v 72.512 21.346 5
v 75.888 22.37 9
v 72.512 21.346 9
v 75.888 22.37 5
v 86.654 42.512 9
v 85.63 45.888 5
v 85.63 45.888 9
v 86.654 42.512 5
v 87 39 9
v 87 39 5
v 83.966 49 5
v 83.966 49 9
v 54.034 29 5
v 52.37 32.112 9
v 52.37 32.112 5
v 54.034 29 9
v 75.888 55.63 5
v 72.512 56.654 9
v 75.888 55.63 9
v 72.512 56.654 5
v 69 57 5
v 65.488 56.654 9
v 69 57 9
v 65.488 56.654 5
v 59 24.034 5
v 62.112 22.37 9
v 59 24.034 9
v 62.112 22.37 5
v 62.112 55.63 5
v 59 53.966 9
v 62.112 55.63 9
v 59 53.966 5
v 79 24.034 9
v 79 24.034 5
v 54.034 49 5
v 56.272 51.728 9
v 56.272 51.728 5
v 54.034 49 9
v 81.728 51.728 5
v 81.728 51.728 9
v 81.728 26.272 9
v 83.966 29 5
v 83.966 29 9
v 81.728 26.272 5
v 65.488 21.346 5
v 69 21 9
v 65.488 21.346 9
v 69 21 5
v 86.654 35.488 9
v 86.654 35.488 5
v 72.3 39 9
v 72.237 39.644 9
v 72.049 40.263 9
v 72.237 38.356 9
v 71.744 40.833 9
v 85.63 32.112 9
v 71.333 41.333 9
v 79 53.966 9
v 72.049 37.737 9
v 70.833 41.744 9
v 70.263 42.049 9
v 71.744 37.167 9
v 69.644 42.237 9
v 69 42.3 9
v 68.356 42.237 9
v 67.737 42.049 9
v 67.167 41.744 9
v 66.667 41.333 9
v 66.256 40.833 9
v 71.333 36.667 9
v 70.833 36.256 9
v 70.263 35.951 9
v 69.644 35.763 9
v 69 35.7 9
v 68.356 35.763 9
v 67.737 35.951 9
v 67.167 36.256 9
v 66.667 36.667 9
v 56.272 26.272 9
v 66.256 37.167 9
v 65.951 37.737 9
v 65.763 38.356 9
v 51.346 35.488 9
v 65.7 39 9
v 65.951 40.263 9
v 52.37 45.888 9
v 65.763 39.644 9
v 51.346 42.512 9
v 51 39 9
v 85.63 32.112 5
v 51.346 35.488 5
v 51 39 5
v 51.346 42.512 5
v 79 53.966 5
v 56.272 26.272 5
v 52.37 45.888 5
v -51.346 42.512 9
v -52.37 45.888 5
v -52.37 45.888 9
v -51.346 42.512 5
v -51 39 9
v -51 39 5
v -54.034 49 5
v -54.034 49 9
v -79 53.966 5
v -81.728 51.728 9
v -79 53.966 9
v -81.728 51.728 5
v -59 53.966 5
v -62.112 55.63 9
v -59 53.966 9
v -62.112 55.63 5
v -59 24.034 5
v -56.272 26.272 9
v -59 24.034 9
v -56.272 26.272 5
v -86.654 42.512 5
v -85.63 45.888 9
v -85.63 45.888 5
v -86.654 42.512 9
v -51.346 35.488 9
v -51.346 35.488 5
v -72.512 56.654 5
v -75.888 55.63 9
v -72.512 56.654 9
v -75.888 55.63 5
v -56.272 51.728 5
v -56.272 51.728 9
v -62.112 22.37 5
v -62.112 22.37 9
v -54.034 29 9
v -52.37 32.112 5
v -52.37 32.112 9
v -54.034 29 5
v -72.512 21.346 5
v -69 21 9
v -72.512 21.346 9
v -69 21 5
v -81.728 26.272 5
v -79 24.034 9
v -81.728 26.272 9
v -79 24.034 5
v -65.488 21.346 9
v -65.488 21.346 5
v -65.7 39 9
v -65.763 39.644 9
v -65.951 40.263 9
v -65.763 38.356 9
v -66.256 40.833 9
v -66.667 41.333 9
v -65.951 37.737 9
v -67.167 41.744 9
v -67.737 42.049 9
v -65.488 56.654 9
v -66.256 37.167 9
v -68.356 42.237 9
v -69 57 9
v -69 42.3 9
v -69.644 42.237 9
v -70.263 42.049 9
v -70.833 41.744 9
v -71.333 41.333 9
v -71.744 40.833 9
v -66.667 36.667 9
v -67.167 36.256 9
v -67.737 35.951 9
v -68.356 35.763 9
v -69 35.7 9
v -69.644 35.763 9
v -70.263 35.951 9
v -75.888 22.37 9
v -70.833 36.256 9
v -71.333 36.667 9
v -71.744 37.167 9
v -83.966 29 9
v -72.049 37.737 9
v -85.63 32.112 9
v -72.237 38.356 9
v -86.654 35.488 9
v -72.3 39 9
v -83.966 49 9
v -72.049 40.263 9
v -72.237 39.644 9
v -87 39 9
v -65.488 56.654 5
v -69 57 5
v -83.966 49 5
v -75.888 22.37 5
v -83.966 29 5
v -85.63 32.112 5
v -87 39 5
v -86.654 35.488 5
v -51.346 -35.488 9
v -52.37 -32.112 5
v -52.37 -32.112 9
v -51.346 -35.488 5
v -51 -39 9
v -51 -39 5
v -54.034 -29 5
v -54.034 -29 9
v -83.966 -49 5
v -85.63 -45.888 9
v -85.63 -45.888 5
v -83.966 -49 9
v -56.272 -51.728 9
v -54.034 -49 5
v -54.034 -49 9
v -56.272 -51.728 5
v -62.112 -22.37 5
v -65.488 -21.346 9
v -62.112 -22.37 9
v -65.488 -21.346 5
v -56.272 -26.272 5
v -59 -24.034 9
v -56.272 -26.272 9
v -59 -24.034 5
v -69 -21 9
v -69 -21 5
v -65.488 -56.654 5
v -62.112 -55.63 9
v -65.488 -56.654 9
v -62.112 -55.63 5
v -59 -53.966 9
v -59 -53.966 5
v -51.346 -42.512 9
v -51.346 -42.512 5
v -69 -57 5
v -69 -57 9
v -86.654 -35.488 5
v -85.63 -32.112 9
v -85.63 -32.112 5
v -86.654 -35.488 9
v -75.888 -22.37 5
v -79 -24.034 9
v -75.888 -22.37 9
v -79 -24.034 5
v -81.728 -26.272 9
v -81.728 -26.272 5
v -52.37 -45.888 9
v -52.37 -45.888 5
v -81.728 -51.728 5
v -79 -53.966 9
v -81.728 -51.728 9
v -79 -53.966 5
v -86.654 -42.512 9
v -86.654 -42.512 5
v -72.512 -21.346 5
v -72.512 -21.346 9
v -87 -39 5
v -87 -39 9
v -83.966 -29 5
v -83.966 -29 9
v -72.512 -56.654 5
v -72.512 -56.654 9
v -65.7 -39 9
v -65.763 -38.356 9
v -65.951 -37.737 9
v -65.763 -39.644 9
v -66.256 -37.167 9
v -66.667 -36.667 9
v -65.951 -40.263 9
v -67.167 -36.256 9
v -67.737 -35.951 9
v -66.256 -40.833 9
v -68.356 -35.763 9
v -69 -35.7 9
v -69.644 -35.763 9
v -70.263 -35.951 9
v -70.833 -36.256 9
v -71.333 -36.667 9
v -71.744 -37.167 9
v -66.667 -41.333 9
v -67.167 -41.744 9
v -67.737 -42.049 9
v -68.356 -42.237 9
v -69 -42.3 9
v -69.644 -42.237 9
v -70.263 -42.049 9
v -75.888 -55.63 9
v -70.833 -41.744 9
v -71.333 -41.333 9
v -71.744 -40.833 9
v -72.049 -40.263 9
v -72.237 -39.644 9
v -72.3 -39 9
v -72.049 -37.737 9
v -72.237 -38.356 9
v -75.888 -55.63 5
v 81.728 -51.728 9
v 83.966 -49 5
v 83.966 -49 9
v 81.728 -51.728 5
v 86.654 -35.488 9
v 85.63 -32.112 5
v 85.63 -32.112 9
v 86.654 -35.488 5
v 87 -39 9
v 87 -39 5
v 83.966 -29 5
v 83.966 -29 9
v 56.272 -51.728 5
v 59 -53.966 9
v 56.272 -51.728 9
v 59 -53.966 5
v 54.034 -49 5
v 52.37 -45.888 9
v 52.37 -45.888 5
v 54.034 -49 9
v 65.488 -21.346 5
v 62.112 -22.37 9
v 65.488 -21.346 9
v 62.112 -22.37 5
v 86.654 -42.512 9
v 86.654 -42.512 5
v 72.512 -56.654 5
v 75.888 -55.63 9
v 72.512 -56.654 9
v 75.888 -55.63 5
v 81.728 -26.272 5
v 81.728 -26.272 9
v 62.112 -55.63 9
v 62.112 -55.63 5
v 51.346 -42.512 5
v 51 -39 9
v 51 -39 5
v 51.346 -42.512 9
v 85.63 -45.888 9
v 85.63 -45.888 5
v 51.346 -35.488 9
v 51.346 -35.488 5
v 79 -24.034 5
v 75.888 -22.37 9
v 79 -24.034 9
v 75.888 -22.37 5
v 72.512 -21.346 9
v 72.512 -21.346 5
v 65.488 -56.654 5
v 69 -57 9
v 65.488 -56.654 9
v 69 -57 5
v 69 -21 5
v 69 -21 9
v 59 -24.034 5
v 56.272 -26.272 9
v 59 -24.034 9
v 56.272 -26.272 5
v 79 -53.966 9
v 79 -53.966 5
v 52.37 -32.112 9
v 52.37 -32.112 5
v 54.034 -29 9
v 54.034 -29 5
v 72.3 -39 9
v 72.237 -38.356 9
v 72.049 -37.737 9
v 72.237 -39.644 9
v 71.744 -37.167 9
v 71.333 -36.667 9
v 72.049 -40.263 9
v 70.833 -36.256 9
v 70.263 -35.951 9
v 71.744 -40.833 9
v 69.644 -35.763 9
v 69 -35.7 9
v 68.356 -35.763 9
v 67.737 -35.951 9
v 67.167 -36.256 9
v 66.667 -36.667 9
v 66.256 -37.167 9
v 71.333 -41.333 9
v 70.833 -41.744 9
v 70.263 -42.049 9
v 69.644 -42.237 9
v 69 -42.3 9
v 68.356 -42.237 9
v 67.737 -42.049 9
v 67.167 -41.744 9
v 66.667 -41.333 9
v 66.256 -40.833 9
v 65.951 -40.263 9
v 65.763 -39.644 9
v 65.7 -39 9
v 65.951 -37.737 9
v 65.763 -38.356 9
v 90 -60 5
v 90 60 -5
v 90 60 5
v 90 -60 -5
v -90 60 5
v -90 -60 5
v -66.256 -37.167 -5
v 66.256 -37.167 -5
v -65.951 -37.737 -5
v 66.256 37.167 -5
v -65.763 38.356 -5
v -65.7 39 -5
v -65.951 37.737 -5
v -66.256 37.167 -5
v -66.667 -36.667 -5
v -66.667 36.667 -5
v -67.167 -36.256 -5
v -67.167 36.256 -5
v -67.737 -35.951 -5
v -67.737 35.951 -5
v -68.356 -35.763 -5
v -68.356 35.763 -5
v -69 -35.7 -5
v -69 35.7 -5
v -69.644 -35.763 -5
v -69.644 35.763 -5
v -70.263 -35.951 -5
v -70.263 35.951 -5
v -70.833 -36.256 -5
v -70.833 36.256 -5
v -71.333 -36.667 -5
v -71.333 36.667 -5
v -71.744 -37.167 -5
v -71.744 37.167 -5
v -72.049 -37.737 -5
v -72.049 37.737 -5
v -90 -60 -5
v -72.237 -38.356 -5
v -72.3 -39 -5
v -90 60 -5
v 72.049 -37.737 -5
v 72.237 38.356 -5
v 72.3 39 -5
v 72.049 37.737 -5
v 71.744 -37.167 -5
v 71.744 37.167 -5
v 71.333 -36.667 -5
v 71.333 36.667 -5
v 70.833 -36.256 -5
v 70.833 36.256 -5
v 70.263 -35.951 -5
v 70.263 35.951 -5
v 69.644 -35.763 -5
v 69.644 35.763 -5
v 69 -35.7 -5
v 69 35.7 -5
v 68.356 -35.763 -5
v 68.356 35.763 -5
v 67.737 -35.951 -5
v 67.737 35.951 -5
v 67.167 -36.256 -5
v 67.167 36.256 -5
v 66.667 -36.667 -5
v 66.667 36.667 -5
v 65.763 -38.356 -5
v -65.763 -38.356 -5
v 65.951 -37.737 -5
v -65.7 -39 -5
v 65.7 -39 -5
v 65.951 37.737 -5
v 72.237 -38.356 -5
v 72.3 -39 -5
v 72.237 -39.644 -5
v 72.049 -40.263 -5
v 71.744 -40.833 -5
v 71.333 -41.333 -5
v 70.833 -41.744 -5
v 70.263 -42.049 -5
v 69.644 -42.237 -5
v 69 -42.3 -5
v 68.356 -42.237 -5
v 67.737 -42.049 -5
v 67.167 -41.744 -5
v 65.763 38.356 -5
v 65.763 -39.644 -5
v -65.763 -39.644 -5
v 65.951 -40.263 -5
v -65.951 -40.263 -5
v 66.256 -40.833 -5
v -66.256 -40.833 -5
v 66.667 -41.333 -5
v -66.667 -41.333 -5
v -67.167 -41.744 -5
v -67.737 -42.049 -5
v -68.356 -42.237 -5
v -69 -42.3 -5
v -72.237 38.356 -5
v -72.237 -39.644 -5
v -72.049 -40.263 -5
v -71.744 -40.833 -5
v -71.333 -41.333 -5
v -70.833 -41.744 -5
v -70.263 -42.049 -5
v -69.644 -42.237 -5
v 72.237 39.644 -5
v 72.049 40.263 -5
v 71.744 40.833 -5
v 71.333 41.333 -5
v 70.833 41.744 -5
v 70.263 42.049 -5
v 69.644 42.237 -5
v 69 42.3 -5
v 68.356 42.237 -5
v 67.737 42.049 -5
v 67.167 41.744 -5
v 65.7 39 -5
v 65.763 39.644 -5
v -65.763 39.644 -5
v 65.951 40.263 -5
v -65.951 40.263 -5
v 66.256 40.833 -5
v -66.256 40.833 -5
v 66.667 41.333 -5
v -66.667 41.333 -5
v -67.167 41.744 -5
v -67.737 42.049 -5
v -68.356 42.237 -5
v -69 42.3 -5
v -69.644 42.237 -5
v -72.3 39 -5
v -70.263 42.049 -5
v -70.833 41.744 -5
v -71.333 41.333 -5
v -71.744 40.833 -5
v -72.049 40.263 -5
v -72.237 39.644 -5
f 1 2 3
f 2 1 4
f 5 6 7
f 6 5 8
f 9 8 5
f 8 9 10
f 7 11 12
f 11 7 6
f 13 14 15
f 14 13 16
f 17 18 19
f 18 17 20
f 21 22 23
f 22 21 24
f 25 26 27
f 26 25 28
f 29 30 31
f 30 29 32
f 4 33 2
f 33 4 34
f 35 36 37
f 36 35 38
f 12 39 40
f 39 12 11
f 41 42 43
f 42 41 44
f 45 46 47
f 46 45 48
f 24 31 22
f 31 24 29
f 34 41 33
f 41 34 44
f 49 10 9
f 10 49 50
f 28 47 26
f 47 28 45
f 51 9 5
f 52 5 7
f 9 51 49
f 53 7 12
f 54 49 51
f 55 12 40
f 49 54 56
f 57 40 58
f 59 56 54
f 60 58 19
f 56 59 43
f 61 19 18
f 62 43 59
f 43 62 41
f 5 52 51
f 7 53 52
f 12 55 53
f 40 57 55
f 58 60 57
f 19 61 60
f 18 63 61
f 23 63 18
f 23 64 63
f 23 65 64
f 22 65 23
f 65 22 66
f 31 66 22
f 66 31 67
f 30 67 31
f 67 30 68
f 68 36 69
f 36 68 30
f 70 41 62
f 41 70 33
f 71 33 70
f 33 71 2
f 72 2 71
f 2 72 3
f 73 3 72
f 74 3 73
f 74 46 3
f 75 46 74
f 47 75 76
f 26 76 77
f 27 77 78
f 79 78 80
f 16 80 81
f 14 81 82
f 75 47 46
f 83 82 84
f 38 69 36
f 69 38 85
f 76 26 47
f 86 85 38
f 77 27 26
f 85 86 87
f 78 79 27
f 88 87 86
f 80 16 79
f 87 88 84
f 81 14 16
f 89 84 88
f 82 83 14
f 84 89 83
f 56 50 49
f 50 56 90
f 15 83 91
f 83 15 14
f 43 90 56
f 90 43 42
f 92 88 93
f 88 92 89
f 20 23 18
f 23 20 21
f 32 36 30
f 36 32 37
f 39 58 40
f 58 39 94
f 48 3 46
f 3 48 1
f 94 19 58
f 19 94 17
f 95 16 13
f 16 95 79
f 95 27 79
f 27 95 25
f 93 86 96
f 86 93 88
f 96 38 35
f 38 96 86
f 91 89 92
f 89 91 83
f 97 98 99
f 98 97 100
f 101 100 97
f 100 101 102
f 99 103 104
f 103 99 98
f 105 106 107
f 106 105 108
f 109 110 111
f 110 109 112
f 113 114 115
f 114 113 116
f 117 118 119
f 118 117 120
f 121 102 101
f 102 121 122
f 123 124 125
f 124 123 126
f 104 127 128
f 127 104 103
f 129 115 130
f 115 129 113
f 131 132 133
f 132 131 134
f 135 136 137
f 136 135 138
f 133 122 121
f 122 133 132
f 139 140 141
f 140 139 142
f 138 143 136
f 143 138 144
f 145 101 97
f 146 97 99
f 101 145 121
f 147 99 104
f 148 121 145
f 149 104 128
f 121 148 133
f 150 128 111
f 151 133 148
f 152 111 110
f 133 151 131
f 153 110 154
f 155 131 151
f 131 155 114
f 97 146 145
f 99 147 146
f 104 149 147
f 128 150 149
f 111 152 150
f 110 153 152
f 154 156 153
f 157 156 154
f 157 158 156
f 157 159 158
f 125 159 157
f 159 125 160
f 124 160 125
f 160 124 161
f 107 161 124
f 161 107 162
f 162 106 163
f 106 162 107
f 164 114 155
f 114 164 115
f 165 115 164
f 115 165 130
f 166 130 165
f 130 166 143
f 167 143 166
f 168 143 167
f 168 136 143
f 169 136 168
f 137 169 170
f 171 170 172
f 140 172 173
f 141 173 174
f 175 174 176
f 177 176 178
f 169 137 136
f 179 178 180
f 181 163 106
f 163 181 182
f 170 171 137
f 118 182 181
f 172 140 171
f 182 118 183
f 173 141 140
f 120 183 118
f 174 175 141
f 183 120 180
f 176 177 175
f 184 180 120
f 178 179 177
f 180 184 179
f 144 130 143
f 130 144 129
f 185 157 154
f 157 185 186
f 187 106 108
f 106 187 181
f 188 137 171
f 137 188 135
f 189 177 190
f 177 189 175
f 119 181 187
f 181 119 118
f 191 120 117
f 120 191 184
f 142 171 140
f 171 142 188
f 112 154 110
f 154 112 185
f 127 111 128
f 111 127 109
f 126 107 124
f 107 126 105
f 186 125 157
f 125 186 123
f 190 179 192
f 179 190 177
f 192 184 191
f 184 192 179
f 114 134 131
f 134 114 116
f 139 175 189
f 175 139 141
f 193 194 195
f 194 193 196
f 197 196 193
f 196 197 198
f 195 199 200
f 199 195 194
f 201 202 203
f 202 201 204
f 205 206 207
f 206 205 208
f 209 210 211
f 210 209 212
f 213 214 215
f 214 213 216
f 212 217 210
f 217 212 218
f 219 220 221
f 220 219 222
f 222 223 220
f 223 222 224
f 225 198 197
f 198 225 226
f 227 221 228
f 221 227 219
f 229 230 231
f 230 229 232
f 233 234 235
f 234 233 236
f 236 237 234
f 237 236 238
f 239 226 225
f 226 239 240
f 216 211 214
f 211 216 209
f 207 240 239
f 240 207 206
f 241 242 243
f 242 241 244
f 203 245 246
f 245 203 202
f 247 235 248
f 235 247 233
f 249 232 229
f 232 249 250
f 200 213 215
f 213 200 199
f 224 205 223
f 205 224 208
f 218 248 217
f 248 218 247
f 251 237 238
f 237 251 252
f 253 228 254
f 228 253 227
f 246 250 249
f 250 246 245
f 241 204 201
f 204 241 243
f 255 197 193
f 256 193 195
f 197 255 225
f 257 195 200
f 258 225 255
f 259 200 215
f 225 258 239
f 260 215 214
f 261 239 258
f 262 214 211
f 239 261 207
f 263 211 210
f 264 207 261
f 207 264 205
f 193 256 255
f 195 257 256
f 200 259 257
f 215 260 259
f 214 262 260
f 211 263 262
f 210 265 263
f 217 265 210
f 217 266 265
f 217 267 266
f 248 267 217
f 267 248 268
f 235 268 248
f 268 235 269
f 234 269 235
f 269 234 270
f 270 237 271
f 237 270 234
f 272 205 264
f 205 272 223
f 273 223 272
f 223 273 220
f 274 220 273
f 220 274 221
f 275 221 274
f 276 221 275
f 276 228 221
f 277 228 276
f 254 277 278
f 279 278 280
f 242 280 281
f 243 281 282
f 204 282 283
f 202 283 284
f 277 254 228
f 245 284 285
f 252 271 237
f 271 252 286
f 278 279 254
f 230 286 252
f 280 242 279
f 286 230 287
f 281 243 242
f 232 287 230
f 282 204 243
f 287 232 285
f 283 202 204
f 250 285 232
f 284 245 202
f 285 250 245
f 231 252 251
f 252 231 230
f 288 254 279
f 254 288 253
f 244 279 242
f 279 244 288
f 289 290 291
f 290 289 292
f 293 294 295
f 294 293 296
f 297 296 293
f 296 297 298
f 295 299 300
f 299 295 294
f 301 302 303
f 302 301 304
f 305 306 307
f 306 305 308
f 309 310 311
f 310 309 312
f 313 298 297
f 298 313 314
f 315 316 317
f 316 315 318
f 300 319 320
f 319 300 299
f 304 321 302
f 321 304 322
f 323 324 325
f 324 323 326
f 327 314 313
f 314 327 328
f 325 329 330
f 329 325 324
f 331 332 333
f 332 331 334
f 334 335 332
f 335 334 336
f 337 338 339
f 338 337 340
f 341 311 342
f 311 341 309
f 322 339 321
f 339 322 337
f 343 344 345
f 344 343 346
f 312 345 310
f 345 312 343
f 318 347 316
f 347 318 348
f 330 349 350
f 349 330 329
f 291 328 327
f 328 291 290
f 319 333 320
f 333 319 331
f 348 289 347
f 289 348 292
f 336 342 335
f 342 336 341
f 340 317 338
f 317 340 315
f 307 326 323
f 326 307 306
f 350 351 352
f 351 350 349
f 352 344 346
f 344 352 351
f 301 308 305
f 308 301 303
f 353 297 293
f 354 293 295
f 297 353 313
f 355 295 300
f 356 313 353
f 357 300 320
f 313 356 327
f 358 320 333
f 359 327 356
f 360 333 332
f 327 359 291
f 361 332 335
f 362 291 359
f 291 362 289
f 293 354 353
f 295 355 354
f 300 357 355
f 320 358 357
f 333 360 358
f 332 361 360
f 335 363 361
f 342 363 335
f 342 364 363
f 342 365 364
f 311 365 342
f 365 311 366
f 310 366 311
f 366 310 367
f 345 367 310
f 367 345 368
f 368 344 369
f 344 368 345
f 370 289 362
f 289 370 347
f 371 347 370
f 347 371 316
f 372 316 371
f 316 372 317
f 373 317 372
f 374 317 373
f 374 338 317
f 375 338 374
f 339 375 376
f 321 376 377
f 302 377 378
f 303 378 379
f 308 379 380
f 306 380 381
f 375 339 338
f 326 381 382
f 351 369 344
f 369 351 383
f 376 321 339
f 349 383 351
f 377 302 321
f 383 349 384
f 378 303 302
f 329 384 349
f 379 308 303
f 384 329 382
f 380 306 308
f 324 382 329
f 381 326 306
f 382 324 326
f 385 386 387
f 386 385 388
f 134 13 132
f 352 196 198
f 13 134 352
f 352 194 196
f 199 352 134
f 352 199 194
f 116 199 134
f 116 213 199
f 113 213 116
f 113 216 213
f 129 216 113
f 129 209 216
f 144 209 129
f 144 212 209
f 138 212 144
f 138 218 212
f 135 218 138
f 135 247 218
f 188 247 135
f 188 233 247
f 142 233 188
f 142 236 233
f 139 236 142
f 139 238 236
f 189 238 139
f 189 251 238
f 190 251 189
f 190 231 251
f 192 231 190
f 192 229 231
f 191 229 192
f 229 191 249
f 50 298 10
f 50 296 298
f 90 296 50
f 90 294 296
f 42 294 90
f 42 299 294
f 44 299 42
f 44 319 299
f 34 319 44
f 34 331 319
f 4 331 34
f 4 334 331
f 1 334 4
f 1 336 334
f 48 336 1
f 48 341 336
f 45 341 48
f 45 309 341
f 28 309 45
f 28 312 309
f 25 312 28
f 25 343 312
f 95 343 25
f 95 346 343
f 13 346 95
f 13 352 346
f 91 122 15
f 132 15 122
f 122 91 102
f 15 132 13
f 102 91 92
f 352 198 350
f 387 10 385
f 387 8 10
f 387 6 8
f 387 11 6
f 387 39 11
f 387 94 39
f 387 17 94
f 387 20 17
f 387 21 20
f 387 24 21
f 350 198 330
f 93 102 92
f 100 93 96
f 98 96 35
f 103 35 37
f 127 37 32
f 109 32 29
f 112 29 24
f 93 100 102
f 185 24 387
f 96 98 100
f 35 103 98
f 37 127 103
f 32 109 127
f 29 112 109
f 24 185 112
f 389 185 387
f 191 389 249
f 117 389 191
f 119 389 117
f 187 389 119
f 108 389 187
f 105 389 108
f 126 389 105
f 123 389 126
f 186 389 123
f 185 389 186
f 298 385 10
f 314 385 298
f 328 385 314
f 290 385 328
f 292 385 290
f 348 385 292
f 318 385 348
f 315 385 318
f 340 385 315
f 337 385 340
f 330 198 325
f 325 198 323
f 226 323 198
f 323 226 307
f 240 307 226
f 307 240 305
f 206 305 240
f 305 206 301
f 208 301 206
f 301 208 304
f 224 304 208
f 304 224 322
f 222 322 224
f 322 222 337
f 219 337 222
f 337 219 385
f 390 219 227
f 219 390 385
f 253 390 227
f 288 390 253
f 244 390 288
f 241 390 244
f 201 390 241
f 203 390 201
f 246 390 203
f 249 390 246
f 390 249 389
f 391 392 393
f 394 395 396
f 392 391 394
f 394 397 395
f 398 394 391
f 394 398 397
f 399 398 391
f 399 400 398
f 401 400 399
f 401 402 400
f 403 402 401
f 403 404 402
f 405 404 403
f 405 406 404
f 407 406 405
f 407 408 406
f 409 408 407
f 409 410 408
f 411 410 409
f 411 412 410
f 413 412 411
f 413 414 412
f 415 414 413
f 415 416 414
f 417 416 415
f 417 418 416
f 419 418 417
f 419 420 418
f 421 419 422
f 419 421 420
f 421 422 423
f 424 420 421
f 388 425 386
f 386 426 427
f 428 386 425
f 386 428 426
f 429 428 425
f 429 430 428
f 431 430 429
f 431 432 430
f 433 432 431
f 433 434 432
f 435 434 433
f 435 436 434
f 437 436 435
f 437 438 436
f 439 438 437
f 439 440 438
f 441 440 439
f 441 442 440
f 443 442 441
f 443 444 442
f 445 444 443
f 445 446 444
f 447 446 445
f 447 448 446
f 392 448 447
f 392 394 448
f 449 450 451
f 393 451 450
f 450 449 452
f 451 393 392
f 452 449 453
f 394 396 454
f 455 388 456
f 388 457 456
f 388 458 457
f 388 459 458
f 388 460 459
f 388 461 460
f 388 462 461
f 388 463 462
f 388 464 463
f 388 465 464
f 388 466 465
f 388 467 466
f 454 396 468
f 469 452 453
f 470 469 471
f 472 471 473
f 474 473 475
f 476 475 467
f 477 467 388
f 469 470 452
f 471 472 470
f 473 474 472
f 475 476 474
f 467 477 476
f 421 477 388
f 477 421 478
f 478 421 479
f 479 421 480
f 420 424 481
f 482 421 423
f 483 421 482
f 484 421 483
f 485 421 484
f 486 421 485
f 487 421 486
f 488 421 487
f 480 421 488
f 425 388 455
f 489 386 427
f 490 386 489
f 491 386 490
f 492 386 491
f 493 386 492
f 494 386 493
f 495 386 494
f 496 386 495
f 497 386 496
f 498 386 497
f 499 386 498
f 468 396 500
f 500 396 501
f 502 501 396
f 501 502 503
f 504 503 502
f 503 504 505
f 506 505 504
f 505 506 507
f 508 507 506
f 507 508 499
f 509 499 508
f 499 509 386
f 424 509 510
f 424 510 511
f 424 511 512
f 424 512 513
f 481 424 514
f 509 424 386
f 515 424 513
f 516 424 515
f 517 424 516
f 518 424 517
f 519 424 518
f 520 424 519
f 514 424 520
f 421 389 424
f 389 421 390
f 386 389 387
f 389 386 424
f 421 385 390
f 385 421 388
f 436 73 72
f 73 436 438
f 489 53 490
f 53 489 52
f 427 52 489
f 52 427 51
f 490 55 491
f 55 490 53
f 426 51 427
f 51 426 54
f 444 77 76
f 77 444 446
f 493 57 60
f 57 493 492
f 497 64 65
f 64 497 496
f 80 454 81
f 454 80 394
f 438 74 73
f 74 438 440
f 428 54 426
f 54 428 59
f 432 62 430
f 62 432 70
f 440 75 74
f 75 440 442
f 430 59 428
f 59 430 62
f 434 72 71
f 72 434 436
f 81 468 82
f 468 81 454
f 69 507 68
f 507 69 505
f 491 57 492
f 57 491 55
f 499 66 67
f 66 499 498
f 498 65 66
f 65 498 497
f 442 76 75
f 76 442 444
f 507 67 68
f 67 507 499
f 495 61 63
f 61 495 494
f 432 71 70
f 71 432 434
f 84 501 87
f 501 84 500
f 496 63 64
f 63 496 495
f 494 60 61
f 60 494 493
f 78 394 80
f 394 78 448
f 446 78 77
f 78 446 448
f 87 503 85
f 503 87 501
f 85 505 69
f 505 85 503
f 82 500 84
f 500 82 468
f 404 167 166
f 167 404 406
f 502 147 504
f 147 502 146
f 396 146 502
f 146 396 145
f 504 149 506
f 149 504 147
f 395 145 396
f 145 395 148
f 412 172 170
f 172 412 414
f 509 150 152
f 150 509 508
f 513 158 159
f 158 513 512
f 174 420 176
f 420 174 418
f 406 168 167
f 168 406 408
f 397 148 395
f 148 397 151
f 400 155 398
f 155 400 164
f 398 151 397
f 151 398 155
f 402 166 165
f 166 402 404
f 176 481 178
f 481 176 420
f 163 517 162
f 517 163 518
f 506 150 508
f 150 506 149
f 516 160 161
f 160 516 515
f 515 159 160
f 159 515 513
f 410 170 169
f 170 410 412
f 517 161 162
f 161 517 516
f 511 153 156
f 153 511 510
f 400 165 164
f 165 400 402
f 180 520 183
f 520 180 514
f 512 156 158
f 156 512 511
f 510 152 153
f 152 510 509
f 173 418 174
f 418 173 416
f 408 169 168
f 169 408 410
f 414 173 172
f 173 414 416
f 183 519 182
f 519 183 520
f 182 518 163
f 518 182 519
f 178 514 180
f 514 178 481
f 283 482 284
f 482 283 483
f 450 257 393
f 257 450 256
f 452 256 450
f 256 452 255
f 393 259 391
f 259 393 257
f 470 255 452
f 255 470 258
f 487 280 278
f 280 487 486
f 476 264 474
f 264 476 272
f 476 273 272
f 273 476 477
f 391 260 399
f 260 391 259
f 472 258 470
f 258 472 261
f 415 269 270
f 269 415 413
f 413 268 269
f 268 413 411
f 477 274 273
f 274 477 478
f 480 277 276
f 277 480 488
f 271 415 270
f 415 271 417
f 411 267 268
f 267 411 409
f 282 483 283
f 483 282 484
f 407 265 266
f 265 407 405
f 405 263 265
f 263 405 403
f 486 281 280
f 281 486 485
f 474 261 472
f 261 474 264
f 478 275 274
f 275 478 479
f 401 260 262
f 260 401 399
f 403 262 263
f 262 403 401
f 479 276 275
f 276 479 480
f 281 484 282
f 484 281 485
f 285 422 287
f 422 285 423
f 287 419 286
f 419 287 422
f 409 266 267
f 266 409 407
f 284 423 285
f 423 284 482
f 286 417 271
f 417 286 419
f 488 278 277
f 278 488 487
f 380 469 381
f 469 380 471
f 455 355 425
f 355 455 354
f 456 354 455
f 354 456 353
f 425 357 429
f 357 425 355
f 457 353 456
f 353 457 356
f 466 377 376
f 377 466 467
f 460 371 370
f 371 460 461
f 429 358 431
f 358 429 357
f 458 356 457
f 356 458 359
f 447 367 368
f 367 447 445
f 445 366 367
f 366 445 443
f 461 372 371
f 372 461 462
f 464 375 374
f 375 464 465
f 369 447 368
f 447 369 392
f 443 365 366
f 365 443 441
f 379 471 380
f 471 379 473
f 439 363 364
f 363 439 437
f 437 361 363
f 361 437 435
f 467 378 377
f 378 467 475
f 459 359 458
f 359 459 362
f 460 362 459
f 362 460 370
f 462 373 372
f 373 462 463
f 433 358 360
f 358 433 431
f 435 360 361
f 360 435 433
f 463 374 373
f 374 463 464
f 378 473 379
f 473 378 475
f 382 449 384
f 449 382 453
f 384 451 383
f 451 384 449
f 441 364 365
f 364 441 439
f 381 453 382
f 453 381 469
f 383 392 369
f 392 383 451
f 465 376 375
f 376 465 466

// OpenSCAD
$fn = 32;

// ----------------------------------------------------------------------
// Anchor pads 180 x 120 x 14
// four corner bosses with anchor holes
// ----------------------------------------------------------------------

// --- parameters (mm) ---
plate = [180, 120, 10];  // base plate size (x, y, z)
pads = 4;                // boss count, one per corner
edge = 21;               // boss centre offset from the plate edge
boss_d = 36;             // boss diameter
boss_h = 4;              // boss height above the base plate
hole_d = 6.6;            // hole diameter

// --- derived feature positions (mm) ---
height = plate[2] + boss_h;      // = 14   overall height of the part
corner_x = plate[0] / 2 - edge;  // = 69   boss centre X
corner_y = plate[1] / 2 - edge;  // = 39   boss centre Y
feature_centers = [
  [corner_x, corner_y],
  [-corner_x, corner_y],
  [-corner_x, -corner_y],
  [corner_x, -corner_y]
];   // boss centres, anchor holes are drilled there

// base plate, four bosses standing on it, anchor holes all the way through
difference() {
  union() {
    cube(plate, center = true);
    for (centre = feature_centers)
      translate([centre[0], centre[1], plate[2] / 2 - 1])
        cylinder(d = boss_d, h = boss_h + 1);
  }
  for (centre = feature_centers)
    translate([centre[0], centre[1], -height])
      cylinder(d = hole_d, h = 2 * height + 2);  // through boss and plate
}
